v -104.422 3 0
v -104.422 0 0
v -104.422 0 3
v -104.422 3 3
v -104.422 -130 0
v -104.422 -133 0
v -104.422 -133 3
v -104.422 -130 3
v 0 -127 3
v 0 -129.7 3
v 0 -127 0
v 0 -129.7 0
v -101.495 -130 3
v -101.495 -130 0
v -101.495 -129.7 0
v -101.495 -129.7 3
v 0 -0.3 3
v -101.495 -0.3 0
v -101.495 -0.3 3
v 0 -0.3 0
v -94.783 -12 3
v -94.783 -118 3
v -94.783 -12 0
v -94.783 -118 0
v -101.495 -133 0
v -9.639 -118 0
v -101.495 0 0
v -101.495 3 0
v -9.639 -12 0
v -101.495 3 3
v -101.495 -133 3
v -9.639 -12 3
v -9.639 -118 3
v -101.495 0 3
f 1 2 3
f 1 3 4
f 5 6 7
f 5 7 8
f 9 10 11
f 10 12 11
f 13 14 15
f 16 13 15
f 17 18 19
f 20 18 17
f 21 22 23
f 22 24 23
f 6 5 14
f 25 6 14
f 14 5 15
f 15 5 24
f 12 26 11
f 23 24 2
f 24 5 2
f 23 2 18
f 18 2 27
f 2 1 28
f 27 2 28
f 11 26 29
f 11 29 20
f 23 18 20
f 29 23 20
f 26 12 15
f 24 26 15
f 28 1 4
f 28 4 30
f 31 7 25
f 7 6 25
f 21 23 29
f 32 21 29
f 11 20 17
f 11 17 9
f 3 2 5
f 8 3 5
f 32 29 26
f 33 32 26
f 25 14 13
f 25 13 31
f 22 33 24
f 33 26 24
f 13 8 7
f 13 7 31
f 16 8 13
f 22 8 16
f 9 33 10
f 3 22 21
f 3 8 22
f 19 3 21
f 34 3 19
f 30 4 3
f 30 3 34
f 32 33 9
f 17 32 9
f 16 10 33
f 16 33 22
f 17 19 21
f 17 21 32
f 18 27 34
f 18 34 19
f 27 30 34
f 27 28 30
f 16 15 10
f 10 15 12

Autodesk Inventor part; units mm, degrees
ref_plane "YZ Plane" through (0, 0, 0) normal (1, 0, 0) x (0, 1, 0)
ref_plane "XZ Plane" through (0, 0, 0) normal (0, 1, 0) x (-1, 0, 0)
ref_plane "XY Plane" through (0, 0, 0) normal (0, 0, 1) x (1, 0, 0)
sketch "Boceto1" plane through (0, 0, 0) normal (0, 0, 1) x (1, 0, 0)
  line L0 (0, 0) -> (0, -127) projected
  line L1 (0, -130) -> (0, -127) projected
  line L2 (-101.4948, -130) -> (-101.4948, -133)
  line L3 (-101.4948, 3) -> (-101.4948, 0)
  line L4 (-104.4221, 0) -> (-104.4221, -130)
  line L5 (-104.4221, -133) -> (-101.4948, -133)
  line L6 (-104.4221, 3) -> (-101.4948, 3)
  line L7 (-9.639, -118) -> (-94.7832, -118)
  line L8 (-94.7832, -118) -> (-94.7832, -12)
  line L9 (-94.7832, -12) -> (-9.639, -12)
  line L10 (-9.639, -12) -> (-9.639, -118)
  line L11 (-9.639, -118) -> (-94.7832, -12) construction
  line L12 (-94.7832, -118) -> (-9.639, -12) construction
  line L13 (-104.4221, -133) -> (-104.4221, -130)
  line L14 (-104.4221, 0) -> (-104.4221, 3)
  line L15 (-101.4948, -130) -> (-101.4948, -129.7)
  line L16 (-101.4948, -129.7) -> (0, -129.7)
  line L17 (-101.4948, 0) -> (-101.4948, -0.3)
  line L18 (-101.4948, -0.3) -> (0, -0.3)
  point P0 (-2.2595, 0)
  dimension "d3" = 9.639
  dimension "d4" = 0.3
  dimension "d5" = 0.3
extrude "Extrusión1" add sketch "Boceto1" along normal blind 3
